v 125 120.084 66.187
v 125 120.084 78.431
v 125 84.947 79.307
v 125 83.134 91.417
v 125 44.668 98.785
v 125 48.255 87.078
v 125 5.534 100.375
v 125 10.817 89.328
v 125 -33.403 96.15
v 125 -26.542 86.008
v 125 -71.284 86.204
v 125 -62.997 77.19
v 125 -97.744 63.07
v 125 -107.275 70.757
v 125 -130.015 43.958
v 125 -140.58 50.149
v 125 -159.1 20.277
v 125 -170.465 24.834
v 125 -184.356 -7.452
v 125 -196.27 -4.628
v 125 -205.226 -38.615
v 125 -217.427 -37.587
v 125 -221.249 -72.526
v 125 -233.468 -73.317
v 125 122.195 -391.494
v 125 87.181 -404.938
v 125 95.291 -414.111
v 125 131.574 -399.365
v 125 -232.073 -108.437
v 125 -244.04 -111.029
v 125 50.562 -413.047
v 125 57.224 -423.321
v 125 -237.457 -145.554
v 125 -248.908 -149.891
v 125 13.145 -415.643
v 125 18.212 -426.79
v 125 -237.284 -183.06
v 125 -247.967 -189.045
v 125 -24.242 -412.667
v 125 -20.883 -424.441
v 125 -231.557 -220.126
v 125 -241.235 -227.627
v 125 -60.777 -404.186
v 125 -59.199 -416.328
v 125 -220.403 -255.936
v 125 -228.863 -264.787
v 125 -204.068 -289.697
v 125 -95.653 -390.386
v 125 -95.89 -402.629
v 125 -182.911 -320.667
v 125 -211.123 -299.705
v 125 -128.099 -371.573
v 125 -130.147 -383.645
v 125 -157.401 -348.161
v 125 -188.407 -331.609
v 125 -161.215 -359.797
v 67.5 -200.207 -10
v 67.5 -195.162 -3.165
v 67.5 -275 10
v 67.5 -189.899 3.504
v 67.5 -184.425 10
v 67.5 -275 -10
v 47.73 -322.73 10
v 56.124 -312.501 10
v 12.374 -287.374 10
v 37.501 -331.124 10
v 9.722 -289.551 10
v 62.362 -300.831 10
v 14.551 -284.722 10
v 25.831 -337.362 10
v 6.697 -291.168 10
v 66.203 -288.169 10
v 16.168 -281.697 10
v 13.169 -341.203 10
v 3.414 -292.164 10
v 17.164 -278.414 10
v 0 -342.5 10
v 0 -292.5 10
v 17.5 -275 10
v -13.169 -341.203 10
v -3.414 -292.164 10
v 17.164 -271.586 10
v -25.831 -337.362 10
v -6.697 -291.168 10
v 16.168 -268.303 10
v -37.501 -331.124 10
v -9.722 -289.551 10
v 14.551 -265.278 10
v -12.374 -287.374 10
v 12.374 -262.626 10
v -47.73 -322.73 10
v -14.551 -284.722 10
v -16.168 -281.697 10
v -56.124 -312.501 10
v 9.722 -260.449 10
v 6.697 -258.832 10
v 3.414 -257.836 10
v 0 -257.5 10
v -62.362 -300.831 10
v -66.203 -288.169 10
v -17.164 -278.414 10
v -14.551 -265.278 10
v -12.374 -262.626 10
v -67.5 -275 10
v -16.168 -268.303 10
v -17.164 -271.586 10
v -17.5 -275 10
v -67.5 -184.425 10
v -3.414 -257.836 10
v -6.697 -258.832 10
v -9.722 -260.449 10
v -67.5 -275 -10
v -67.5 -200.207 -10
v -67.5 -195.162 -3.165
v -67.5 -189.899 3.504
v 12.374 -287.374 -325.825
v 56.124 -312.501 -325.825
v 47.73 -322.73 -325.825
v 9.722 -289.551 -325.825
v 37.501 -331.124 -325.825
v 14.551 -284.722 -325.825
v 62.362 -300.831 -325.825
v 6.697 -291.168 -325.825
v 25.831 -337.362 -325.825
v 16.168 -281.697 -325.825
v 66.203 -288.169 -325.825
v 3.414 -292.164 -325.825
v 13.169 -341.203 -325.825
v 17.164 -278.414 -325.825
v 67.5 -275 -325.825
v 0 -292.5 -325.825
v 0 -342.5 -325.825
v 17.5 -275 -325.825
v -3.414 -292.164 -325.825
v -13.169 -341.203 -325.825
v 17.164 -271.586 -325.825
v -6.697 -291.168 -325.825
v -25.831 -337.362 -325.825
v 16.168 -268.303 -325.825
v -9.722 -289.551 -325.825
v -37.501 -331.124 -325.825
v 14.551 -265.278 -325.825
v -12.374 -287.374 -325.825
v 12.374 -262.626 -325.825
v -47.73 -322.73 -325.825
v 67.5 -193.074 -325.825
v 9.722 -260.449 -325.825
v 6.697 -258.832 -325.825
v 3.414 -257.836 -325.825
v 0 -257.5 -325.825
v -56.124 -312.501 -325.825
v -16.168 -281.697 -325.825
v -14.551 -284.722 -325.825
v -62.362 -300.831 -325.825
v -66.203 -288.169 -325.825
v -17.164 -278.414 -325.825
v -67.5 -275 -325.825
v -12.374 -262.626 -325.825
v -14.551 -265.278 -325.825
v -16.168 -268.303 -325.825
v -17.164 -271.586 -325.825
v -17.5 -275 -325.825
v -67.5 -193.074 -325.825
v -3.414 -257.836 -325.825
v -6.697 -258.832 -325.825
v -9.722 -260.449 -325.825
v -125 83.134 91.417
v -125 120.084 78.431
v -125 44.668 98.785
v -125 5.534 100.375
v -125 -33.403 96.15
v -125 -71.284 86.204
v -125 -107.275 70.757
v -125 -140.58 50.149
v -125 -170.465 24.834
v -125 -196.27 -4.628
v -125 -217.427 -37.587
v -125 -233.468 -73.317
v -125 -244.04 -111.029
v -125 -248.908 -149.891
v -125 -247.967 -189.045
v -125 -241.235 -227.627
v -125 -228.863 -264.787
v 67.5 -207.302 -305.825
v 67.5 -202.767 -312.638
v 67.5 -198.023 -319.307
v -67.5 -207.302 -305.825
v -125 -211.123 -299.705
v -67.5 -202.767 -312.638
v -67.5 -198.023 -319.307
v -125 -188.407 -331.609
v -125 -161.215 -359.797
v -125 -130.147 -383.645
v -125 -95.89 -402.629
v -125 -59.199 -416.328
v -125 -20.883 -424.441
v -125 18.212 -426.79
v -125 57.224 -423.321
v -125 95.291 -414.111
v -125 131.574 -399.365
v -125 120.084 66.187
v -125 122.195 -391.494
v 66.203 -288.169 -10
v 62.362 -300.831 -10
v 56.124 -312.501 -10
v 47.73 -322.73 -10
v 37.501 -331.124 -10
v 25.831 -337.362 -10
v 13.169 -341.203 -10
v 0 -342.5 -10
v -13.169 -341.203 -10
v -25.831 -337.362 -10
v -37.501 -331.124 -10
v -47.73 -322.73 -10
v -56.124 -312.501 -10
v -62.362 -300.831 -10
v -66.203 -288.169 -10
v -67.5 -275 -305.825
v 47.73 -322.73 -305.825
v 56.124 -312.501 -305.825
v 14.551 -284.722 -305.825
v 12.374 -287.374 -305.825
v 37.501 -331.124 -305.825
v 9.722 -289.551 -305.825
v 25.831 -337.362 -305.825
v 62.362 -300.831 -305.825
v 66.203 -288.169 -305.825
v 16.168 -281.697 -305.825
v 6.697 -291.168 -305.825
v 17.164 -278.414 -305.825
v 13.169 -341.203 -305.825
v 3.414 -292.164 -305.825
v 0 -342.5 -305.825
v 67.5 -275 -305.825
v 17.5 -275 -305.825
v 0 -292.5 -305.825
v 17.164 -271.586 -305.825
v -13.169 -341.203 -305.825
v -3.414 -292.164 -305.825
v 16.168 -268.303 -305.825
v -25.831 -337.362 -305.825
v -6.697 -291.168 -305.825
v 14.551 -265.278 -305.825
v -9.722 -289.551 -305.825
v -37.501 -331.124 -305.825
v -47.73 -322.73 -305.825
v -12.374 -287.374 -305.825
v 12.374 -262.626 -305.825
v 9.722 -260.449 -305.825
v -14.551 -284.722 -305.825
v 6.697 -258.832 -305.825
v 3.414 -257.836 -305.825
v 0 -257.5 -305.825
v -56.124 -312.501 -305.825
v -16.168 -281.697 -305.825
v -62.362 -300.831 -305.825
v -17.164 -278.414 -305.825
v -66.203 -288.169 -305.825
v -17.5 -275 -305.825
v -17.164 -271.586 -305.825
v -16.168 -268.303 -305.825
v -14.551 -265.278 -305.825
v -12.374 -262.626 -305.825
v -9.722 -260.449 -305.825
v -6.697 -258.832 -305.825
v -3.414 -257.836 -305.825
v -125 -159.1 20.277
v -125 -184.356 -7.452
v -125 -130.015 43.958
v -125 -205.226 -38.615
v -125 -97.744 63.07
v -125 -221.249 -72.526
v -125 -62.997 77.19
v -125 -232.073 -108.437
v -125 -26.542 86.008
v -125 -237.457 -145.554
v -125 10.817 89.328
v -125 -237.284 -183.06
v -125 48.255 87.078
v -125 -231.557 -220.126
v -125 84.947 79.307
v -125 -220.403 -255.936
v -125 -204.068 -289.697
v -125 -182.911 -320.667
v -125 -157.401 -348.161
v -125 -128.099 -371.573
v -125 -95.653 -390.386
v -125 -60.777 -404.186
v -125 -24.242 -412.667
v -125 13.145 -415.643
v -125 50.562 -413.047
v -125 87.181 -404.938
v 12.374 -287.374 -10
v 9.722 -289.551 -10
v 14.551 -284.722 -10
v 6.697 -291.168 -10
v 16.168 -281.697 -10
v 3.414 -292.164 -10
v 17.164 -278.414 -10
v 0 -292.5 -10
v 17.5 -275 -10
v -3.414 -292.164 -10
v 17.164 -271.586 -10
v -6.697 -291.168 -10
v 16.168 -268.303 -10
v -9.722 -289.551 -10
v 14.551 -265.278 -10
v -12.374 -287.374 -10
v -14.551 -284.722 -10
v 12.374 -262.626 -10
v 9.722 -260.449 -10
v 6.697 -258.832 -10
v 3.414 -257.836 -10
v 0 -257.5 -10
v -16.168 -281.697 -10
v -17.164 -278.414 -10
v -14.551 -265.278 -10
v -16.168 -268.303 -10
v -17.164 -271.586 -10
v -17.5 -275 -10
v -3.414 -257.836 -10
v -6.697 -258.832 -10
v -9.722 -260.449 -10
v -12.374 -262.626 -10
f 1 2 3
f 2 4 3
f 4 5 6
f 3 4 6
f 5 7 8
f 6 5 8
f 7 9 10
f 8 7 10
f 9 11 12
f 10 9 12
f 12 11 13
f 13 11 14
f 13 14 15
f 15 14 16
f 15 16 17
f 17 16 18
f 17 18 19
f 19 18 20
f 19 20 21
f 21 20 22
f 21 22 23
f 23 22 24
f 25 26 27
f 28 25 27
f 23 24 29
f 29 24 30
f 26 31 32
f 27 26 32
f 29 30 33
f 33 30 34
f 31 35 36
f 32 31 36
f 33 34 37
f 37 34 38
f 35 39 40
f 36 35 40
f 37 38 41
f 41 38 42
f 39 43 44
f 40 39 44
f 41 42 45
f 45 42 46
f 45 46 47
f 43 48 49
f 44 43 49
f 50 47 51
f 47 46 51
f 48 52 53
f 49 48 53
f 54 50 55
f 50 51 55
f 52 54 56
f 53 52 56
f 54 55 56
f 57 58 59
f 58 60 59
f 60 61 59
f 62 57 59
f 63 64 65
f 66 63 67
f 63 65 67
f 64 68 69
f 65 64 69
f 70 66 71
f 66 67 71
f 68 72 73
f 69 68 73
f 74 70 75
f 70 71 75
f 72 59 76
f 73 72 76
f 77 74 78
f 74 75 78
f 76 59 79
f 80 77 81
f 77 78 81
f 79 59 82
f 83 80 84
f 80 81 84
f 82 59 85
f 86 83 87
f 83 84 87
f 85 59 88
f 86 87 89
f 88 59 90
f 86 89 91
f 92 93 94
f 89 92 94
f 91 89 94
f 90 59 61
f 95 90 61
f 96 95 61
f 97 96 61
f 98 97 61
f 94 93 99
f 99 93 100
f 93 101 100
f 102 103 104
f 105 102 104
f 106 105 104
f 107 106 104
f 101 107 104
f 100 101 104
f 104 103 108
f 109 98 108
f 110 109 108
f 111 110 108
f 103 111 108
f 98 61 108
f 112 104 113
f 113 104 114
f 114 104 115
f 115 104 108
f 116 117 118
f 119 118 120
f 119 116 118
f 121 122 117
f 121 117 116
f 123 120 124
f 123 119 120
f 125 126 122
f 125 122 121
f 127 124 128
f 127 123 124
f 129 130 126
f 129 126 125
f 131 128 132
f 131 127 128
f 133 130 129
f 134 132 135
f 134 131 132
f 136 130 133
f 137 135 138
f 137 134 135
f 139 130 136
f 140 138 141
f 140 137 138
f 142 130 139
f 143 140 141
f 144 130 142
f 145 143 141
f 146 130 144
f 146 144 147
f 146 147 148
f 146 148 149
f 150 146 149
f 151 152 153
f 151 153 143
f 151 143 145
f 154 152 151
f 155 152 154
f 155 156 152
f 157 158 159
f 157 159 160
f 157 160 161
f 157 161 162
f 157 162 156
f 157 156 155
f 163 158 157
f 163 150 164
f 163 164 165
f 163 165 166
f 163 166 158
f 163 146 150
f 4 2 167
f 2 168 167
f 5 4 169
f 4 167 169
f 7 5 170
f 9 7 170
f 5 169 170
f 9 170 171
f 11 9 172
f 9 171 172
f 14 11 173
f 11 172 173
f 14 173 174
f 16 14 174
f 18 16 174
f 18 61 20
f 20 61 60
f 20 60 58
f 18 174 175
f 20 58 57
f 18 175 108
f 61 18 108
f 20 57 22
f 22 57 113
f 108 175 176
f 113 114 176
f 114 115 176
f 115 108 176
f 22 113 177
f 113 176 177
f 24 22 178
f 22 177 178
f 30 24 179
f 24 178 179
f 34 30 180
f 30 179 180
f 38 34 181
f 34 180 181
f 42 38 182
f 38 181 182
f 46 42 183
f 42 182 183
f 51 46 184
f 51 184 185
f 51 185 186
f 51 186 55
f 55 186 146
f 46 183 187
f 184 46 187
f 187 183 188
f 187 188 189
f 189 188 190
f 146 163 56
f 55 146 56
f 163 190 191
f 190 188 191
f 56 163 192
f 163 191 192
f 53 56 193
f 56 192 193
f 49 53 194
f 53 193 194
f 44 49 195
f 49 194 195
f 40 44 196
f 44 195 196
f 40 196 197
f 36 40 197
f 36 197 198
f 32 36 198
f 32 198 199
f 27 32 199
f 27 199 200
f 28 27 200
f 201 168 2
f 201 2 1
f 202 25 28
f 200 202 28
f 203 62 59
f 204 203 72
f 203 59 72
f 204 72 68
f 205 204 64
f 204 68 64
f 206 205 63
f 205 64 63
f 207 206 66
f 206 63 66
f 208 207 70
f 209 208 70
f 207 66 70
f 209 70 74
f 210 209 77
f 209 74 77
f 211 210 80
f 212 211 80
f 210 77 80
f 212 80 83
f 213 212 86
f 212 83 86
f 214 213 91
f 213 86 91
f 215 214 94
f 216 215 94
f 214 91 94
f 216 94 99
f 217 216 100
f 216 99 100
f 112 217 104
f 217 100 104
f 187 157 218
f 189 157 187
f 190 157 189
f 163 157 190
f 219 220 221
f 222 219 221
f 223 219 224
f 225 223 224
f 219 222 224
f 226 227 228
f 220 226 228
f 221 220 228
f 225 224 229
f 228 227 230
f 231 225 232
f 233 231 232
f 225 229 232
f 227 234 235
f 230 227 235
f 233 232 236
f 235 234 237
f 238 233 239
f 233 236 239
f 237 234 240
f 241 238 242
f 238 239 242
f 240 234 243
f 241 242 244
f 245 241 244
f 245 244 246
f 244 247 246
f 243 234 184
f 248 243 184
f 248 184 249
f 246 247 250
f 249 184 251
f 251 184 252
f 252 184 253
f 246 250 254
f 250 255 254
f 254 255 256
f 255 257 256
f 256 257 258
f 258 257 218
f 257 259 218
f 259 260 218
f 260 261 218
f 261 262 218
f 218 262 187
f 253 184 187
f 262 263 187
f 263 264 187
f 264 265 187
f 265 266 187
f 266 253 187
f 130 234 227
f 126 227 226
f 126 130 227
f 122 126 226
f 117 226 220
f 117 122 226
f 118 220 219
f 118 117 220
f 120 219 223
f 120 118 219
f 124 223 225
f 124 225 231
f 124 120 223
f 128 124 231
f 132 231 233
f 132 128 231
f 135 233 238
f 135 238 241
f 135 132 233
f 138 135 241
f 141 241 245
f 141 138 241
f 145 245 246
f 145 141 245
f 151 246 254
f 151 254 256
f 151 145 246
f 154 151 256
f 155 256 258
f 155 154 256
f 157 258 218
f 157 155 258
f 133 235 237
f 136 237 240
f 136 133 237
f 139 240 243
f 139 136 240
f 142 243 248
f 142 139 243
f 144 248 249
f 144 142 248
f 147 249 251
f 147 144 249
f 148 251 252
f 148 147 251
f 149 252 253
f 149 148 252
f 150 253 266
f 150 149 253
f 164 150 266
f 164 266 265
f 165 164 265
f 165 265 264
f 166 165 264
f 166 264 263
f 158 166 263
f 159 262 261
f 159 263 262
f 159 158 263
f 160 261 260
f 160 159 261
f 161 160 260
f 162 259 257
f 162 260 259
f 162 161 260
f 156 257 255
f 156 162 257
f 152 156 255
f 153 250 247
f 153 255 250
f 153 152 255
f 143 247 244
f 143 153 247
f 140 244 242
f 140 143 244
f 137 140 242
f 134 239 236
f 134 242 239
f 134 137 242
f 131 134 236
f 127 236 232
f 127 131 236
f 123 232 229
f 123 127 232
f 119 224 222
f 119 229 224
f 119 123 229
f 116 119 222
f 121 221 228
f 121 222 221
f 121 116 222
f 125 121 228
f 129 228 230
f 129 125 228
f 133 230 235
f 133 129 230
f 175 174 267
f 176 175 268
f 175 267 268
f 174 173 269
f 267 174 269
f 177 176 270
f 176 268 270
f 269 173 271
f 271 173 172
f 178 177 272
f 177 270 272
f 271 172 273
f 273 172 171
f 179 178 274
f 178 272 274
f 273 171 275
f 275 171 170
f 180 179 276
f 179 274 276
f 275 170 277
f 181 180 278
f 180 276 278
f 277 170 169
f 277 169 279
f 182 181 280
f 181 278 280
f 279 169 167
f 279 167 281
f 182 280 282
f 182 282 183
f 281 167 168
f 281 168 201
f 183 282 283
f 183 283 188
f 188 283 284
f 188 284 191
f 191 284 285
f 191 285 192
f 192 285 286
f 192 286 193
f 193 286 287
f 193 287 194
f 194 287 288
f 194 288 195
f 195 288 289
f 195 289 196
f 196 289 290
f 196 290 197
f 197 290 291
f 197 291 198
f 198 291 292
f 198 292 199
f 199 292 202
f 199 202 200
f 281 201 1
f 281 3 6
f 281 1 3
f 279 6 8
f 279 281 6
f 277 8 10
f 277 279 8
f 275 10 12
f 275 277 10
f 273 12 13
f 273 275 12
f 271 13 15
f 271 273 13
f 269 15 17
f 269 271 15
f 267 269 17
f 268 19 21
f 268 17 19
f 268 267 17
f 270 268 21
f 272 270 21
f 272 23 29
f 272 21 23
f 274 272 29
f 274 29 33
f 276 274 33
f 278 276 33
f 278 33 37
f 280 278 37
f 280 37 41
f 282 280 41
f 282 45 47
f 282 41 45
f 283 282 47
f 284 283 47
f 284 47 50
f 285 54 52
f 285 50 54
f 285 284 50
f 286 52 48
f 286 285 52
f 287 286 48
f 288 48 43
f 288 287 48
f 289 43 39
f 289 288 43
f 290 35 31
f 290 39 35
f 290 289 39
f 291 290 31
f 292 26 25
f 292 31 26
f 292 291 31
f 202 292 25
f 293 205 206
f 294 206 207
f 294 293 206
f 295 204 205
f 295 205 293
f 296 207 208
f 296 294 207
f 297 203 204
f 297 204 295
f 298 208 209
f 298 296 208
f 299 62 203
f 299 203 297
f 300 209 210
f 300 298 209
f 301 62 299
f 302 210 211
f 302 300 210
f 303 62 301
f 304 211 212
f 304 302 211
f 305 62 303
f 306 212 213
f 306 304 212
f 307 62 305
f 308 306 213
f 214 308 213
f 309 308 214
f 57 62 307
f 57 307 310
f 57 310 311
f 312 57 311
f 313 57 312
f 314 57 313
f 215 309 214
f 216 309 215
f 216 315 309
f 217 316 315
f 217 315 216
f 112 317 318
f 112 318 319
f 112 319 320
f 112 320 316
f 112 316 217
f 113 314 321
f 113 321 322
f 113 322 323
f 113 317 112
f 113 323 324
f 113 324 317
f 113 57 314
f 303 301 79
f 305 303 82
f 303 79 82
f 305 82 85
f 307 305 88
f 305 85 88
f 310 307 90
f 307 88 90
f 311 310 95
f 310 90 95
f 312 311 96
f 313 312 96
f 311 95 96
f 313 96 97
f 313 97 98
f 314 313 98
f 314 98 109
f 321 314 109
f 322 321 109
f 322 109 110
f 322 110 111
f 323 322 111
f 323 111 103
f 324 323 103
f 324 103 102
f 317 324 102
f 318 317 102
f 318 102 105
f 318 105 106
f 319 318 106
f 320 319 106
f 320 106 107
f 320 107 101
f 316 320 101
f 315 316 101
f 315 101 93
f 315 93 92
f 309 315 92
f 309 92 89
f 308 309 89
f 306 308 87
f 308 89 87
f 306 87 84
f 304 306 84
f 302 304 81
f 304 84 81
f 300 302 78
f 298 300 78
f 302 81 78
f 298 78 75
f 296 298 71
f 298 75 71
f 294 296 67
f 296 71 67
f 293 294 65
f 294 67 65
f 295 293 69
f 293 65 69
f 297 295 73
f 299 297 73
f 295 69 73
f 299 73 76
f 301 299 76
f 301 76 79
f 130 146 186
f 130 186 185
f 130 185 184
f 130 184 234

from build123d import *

# Parameters (mm, degrees)
BOSS_EXTRUDE1_DEPTH     = 10
SKETCH2_R               = 17.5
CUT_EXTRUDE1_DEPTH      = 569.981596971
CUT_EXTRUDE2_DEPTH      = 562.341005262
CUT_EXTRUDE2_DEPTH_BACK = 562.341005262
SKETCH3_R               = 252.5


with BuildPart() as part:
    # Sweep1: sweep along a curve in space
    with BuildLine() as sweep1_path:
        ThreePointArc((0, 120.083798472, 63.431105038), (0, -235.570766963, -163.145841721), (0, 120.083798472, -389.72278848))
    # 3DSketch2 → Sweep1 (sweep)
    with BuildSketch(Plane(origin=(125, 120.083798472, 78.431105038), x_dir=(-0.9928768384869221, 0, -0.11914522061843064), z_dir=(0, -1, 0))):
        Polygon((0, 0), (3.574356619, 29.786305155), (251.79356624, 0), (248.219209622, -29.786305155), align=None)
    sweep(path=sweep1_path.line)

    # Sketch1 → Boss-Extrude1 (add, symmetric)
    with BuildSketch(Plane.XY):
        with BuildLine():
            Line((-67.5, -275), (-67.5, -175))
            Line((-67.5, -175), (67.5, -175))
            Line((67.5, -175), (67.5, -275))
            ThreePointArc((67.5, -275), (0, -342.5), (-67.5, -275))
        make_face()
    boss_extrude1 = extrude(amount=BOSS_EXTRUDE1_DEPTH, both=True)

    # Sketch2 → Cut-Extrude1 (cut, through all)
    with BuildSketch(Plane.XY.offset(10)):
        with Locations((0, -275)):
            Circle(SKETCH2_R)
    cut_extrude1 = extrude(amount=-CUT_EXTRUDE1_DEPTH, mode=Mode.SUBTRACT)

    # Mirror1: Boss-Extrude1, Cut-Extrude1 across plane
    add(boss_extrude1.mirror(Plane(origin=(0, 0, -157.91266462), x_dir=(1, 0, 0), z_dir=(0, 0, -1))))
    add(cut_extrude1.mirror(Plane(origin=(0, 0, -157.91266462), x_dir=(1, 0, 0), z_dir=(0, 0, -1))), mode=Mode.SUBTRACT)

    # Sketch3 → Cut-Extrude2 (cut, two sides: drawn at the far end of the back side and taken through both)
    with BuildSketch(Plane(origin=(0, 0, 0), x_dir=(0, 0, -1), z_dir=(1, 0, 0)).offset(-CUT_EXTRUDE2_DEPTH_BACK)):
        with Locations((163.145841721, 14.429233037)):
            Circle(SKETCH3_R)
    extrude(amount=CUT_EXTRUDE2_DEPTH + CUT_EXTRUDE2_DEPTH_BACK, mode=Mode.SUBTRACT)


solid = part.part
